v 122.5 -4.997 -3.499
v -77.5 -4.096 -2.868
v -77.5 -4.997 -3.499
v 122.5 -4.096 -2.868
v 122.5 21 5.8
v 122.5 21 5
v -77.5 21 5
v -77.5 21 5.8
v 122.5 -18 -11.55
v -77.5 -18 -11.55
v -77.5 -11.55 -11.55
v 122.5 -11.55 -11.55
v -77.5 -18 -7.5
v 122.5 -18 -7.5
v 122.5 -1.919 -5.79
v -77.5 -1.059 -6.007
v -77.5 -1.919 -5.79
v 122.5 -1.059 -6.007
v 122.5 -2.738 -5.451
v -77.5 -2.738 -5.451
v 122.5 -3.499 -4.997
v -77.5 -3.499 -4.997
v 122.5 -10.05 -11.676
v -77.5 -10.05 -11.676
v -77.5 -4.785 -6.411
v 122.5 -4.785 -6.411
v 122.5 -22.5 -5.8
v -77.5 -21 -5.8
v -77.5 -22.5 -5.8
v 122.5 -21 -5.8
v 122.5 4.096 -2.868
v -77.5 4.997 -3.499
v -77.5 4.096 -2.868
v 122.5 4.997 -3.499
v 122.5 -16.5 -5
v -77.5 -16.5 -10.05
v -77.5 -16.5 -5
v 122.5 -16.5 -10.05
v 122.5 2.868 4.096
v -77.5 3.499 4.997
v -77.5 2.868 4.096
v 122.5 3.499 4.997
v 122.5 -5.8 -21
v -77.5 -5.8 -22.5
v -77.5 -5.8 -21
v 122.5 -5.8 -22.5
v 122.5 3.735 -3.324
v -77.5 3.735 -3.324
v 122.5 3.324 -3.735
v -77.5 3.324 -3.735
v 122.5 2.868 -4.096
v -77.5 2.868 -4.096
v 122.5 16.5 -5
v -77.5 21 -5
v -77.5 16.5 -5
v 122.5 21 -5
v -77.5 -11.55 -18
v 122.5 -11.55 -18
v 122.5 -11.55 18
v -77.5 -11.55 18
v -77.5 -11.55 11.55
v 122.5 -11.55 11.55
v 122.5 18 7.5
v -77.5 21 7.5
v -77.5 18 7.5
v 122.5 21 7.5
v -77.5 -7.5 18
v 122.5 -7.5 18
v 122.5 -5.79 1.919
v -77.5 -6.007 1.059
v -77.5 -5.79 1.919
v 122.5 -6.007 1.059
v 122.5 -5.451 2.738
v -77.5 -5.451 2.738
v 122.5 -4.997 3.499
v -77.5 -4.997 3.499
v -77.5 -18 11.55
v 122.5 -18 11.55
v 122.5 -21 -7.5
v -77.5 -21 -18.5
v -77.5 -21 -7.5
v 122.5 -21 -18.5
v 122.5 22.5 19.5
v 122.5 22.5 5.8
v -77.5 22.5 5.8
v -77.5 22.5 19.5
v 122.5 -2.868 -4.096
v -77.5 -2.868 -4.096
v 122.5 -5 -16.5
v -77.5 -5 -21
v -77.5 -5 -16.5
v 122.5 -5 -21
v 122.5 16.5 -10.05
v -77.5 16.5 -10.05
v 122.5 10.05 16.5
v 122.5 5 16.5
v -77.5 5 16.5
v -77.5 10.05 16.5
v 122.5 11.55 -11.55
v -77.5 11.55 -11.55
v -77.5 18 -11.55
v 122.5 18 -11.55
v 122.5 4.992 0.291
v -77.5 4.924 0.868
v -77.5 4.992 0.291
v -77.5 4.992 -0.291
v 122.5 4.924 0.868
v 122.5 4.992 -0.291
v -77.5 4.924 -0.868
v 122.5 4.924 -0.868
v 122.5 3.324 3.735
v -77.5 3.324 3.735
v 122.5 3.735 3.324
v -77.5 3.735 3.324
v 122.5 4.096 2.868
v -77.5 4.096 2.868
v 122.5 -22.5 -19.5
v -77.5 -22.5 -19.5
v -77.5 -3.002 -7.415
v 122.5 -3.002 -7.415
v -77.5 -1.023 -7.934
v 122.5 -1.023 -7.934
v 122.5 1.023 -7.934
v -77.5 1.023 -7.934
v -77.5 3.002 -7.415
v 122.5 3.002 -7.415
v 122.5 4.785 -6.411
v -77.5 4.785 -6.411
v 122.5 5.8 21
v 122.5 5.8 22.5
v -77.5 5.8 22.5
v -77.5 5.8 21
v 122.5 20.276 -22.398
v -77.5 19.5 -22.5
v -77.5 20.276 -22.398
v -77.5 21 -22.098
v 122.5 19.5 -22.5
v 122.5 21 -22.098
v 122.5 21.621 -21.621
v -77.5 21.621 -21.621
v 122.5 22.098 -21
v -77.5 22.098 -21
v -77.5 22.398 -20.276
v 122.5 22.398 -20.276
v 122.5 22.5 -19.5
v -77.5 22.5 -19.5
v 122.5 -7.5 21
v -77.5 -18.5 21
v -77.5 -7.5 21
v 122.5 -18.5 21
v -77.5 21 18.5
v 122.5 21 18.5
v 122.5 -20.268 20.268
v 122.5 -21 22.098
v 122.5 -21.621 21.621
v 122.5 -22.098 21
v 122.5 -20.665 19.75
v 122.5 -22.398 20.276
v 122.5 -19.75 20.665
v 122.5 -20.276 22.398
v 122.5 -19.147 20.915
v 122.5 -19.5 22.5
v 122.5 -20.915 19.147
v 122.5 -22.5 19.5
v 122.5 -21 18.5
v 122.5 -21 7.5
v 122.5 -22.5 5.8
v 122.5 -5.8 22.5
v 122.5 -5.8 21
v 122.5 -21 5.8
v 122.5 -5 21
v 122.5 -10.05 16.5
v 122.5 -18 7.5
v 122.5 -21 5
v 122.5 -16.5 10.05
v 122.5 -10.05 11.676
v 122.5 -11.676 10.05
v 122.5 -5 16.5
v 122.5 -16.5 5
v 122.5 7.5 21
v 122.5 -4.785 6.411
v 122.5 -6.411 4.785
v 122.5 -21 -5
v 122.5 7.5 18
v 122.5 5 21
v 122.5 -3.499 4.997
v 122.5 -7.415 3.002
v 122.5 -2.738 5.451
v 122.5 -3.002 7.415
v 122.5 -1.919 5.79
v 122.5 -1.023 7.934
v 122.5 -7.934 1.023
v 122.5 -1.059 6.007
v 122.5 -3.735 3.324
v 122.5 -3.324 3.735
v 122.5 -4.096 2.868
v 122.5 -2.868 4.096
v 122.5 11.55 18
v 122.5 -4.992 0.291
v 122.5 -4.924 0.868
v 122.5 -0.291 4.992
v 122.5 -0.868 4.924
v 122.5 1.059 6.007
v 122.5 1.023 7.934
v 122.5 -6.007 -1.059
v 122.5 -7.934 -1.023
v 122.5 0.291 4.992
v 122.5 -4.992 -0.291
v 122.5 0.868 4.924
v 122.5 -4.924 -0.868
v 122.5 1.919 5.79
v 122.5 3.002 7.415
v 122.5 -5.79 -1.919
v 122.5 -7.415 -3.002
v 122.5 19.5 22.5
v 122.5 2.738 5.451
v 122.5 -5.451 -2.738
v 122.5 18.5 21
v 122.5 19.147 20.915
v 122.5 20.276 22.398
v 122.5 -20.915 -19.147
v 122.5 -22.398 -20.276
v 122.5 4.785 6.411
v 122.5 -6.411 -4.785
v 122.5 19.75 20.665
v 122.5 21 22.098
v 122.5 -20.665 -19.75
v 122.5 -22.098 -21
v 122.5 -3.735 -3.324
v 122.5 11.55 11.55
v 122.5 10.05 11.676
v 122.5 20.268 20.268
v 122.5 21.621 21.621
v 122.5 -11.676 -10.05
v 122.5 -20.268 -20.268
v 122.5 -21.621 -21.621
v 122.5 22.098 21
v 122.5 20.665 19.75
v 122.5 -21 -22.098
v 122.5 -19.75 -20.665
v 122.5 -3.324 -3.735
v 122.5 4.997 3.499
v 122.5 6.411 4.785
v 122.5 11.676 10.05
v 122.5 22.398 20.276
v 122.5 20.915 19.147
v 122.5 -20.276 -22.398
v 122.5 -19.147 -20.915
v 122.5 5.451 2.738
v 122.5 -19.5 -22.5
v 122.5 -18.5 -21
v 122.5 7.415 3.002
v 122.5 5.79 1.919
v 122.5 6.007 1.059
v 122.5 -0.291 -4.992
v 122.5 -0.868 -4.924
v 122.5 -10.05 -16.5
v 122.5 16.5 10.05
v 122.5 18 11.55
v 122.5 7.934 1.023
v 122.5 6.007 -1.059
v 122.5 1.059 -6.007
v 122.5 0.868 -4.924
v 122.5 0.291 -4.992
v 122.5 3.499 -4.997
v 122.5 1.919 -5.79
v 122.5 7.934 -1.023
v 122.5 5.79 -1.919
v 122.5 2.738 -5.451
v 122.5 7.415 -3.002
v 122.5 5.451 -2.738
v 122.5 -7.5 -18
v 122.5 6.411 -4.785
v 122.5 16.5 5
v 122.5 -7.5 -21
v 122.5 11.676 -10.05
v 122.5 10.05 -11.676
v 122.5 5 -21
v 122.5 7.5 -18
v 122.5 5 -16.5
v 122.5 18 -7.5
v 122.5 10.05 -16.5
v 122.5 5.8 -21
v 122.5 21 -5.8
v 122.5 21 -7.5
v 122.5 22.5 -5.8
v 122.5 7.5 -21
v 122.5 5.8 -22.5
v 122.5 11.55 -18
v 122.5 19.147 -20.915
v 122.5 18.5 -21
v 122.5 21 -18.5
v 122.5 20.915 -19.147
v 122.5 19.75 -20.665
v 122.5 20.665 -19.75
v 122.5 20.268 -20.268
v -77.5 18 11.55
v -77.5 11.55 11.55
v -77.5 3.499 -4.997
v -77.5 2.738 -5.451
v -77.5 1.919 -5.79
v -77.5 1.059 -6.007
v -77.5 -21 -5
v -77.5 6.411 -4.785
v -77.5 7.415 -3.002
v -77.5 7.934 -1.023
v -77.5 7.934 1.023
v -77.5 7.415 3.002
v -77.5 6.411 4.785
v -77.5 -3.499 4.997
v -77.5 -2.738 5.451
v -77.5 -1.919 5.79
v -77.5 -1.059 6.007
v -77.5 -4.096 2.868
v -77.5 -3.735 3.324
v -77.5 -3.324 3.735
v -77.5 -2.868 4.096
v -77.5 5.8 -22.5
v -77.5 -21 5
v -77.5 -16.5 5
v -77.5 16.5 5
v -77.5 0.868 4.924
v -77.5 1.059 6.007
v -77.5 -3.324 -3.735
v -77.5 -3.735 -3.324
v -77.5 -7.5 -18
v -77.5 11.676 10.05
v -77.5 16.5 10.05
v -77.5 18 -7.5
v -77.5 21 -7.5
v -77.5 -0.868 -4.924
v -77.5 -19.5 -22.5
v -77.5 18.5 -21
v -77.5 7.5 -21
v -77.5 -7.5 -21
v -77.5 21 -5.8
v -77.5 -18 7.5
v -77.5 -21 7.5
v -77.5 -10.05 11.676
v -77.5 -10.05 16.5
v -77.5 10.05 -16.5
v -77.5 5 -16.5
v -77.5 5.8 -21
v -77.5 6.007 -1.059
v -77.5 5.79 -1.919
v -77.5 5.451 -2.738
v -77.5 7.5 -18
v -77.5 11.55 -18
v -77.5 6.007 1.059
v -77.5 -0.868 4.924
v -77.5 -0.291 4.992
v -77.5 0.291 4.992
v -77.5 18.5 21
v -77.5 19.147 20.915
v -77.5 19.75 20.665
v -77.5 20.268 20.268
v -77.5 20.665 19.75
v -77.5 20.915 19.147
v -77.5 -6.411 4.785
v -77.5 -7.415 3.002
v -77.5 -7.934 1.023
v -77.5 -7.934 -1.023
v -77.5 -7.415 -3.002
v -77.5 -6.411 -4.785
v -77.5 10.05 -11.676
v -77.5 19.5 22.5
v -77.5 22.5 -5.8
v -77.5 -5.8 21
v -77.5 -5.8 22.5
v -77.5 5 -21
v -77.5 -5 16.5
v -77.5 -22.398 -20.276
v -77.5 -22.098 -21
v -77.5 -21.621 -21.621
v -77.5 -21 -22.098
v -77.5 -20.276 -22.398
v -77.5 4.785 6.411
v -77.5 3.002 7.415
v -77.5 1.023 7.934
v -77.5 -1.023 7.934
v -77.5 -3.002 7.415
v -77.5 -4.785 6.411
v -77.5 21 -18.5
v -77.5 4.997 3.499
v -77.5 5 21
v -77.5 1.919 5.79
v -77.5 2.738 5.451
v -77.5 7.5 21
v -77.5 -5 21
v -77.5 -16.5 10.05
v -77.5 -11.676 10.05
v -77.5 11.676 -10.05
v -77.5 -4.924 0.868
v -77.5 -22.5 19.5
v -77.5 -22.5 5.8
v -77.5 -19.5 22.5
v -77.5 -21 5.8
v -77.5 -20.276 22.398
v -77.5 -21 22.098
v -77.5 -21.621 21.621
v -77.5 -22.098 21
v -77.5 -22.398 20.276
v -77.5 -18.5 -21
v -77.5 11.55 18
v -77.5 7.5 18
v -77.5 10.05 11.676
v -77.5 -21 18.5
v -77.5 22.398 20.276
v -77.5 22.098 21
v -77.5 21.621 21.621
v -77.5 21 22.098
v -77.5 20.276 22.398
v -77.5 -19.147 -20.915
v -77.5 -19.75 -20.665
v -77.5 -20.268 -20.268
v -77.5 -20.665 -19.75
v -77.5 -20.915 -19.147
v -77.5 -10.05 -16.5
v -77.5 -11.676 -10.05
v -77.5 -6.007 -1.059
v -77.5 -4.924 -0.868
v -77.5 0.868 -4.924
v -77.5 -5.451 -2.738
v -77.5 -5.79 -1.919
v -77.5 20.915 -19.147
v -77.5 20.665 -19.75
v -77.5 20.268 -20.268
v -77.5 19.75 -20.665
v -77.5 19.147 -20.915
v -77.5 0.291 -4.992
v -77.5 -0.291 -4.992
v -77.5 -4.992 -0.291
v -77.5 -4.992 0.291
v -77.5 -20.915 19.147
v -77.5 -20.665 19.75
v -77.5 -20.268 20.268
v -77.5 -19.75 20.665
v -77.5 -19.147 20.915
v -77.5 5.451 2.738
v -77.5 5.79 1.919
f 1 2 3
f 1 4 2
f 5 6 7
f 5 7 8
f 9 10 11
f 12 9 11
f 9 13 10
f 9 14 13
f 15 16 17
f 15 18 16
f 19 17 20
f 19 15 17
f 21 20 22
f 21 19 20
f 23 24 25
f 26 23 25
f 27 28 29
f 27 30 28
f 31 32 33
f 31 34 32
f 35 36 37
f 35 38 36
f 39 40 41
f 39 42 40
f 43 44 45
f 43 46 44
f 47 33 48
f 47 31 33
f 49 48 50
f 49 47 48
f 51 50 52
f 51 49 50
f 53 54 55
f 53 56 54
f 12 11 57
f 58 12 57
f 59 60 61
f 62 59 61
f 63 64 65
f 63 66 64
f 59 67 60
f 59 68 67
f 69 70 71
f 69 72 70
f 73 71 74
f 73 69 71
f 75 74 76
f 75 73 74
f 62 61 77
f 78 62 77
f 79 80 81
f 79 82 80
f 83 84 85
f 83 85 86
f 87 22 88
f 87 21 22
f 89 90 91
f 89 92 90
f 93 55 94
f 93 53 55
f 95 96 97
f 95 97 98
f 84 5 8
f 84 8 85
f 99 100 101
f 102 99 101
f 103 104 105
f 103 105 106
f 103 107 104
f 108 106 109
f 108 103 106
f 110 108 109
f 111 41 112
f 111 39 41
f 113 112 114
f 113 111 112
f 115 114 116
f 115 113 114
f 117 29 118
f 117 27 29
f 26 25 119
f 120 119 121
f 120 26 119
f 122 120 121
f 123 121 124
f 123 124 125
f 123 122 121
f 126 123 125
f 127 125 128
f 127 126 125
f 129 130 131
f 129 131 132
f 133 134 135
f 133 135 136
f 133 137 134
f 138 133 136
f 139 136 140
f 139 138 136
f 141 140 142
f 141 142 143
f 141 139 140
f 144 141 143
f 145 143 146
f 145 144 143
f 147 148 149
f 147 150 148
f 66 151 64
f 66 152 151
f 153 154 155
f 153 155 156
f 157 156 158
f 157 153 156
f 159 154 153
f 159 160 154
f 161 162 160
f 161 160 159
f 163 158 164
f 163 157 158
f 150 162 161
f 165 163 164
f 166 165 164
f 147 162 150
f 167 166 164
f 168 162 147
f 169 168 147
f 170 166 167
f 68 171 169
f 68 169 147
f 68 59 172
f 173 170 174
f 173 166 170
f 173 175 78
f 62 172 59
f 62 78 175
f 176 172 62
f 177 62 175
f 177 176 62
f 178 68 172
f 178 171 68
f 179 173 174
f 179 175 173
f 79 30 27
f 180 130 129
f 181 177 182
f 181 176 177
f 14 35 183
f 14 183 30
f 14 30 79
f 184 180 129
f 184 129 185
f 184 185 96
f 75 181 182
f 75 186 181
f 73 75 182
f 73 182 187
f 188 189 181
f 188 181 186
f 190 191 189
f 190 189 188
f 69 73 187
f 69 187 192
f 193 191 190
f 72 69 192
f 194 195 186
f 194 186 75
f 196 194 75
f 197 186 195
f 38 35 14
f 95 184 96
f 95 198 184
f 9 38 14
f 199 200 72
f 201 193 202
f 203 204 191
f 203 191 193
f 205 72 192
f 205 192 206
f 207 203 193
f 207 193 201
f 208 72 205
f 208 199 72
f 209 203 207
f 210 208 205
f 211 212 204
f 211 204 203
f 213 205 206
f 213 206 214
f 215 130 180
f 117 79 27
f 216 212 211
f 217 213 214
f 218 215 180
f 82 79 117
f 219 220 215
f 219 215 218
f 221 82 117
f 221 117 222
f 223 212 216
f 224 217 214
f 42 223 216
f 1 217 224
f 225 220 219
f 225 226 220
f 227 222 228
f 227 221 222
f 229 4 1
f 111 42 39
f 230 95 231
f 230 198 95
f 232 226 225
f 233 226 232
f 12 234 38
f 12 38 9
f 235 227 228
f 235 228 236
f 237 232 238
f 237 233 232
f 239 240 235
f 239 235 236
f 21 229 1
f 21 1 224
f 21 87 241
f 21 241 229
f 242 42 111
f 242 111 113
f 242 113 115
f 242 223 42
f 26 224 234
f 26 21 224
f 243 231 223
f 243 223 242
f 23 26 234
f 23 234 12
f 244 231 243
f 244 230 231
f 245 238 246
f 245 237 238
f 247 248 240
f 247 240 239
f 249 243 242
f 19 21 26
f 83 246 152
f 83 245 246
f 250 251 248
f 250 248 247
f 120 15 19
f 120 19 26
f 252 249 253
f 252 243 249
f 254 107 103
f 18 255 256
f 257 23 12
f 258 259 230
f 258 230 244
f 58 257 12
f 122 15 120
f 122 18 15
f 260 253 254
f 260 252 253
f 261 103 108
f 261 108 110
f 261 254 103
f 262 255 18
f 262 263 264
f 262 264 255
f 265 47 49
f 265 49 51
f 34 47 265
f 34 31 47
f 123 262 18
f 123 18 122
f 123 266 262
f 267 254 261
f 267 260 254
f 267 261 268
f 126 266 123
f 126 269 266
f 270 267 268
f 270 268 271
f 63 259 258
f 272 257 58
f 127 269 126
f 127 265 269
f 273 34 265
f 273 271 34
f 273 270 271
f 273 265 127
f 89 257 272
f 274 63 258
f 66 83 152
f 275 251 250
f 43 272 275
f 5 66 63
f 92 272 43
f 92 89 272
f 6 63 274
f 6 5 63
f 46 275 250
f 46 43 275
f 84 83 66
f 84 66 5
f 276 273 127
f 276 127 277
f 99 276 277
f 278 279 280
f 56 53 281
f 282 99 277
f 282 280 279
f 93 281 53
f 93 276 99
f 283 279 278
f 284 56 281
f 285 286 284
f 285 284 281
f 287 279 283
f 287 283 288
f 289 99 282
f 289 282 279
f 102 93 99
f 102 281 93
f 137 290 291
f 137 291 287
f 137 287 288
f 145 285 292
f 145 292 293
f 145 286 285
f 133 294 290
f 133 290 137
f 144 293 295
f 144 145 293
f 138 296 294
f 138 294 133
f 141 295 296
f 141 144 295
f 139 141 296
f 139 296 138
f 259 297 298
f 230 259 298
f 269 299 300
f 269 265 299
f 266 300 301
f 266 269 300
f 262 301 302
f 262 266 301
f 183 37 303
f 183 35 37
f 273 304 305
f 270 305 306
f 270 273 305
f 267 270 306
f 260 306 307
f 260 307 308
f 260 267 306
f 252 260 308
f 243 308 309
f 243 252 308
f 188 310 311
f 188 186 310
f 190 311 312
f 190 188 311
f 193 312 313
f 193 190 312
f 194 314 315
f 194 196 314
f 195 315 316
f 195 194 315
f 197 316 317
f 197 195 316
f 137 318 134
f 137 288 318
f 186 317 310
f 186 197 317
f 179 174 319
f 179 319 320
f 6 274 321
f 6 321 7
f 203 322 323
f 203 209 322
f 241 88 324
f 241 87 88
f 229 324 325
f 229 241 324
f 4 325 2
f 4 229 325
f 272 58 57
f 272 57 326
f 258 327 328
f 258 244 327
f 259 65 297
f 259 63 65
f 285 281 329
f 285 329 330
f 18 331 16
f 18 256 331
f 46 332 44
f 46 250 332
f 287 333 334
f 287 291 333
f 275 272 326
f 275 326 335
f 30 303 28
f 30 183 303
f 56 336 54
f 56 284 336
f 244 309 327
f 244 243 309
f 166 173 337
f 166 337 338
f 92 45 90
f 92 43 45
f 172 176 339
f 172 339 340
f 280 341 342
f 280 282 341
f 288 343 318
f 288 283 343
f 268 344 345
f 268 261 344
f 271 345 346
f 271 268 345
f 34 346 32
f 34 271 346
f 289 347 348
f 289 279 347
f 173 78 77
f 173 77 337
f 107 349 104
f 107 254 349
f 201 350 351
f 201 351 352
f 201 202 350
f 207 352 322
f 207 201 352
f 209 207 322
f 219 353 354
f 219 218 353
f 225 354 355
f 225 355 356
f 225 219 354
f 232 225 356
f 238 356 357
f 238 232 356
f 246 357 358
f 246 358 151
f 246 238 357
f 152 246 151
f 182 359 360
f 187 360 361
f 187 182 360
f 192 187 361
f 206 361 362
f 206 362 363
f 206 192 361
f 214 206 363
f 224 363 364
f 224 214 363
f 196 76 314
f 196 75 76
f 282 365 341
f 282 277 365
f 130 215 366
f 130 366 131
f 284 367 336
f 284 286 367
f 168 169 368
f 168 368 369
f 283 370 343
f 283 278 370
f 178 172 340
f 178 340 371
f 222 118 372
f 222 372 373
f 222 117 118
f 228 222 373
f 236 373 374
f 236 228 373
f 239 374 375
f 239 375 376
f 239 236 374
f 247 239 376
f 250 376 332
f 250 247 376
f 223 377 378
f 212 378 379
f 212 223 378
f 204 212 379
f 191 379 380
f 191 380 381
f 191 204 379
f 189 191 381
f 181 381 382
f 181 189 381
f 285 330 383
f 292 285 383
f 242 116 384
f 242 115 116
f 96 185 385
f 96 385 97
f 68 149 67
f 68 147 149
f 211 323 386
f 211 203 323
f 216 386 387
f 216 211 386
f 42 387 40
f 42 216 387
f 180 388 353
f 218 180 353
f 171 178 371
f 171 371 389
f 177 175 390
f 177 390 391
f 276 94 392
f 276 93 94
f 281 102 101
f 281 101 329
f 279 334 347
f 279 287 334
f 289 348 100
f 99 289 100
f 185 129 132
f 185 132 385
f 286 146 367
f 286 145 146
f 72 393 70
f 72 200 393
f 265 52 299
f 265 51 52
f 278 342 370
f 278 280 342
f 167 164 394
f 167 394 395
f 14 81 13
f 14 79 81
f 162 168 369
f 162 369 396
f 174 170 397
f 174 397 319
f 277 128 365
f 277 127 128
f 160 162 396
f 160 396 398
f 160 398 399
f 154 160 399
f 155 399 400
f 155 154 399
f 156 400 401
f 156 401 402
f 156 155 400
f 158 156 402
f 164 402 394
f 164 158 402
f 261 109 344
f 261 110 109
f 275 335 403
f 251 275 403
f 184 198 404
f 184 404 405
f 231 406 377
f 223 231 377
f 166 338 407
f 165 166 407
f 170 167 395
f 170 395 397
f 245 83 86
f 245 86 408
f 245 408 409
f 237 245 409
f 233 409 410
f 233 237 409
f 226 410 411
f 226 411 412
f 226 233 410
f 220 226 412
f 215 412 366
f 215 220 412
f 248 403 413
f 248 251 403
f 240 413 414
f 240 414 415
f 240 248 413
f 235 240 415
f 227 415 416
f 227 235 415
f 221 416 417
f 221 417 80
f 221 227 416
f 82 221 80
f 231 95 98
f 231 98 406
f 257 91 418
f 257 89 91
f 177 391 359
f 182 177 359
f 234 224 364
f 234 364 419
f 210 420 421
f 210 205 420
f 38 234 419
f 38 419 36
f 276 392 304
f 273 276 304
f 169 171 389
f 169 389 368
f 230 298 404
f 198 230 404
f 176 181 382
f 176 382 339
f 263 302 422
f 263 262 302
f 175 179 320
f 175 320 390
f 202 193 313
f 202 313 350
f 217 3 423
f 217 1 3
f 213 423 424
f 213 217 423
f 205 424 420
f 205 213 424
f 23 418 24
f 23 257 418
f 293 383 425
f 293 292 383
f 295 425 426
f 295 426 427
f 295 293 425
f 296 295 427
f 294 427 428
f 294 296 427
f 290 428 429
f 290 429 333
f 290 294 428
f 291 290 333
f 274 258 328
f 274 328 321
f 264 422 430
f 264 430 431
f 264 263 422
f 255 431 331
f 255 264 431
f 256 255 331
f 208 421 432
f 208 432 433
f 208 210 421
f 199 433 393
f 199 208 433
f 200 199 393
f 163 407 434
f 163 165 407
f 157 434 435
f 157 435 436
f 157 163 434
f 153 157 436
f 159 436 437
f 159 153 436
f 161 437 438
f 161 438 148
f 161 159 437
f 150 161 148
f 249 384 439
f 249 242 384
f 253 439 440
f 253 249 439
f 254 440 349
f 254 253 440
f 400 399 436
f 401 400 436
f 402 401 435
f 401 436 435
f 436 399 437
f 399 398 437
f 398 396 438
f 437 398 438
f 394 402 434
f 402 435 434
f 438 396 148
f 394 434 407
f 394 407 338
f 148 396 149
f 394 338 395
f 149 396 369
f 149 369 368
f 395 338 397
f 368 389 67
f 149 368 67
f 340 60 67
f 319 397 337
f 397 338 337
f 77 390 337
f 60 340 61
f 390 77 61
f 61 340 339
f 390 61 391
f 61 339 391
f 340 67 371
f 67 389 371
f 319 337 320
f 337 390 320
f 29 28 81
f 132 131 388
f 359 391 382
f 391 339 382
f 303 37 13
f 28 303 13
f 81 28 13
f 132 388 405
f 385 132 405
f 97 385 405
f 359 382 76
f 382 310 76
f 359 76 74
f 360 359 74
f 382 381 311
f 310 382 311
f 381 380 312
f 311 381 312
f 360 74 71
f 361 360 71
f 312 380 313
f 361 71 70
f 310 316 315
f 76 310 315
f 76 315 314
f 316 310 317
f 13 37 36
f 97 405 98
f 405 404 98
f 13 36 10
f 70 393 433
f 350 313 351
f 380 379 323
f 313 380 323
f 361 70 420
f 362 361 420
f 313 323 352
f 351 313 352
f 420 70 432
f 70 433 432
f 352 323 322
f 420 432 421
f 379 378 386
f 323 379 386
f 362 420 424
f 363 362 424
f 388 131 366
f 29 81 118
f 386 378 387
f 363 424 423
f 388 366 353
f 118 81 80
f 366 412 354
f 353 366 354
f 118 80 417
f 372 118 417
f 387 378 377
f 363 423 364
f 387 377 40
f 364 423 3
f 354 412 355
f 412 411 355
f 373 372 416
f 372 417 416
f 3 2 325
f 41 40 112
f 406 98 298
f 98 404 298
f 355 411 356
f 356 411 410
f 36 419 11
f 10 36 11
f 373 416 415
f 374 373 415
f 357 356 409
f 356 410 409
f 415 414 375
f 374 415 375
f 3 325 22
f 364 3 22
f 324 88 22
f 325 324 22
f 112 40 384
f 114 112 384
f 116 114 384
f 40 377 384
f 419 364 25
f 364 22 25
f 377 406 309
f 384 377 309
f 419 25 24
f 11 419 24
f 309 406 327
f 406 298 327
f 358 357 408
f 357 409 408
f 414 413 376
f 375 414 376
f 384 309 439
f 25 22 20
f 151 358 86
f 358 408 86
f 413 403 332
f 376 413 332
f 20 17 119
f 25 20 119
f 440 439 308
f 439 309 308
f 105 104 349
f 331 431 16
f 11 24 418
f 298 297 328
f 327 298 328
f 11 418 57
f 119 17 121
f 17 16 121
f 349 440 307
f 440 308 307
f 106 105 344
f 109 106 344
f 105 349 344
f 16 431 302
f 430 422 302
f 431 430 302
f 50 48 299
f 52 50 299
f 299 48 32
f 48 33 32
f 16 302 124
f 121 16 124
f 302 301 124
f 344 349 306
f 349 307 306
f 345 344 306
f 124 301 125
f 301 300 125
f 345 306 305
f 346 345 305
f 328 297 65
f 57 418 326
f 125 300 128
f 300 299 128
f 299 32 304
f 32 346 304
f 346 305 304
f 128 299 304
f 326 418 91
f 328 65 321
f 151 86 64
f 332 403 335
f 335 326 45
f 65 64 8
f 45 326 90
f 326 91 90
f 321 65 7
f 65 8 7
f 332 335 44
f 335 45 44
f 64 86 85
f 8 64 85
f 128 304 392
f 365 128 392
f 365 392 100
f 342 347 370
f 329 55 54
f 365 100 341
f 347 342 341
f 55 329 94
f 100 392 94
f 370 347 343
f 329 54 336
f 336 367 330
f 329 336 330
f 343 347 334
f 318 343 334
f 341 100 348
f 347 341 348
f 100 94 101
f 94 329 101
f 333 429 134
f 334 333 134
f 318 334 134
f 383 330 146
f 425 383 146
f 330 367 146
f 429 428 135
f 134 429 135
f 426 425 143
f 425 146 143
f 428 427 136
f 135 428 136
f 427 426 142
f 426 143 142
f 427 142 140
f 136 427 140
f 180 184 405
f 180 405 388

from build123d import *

# Parameters (mm, degrees)
BR_EXTRUDE_DEPTH      = 122.5
BR_EXTRUDE_DEPTH_BACK = 77.5


with BuildPart() as part:
    # Sketch2 → BR_Extrude (new body, two sides)
    with BuildSketch(Plane(origin=(0, 0, 0), x_dir=(0, 0, -1), z_dir=(1, 0, 0))) as br_extrude_sk:
        with BuildLine():
            Line((-10.05, 11.676345597), (-10.05, 16.5))
            Line((-10.05, 16.5), (-5, 16.5))
            Line((-5, 16.5), (-5, 21))
            Line((-5, 21), (-5.8, 21))
            Line((-5.8, 21), (-5.8, 22.5))
            Line((-5.8, 22.5), (-19.5, 22.5))
            ThreePointArc((-19.5, 22.5), (-21.621320344, 21.621320344), (-22.5, 19.5))
            Line((-22.5, 19.5), (-22.5, 5.8))
            Line((-22.5, 5.8), (-21, 5.8))
            Line((-21, 5.8), (-21, 5))
            Line((-21, 5), (-16.5, 5))
            Line((-16.5, 5), (-16.5, 10.05))
            Line((-16.5, 10.05), (-11.676345597, 10.05))
            Line((-11.676345597, 10.05), (-6.411275155, 4.784929559))
            ThreePointArc((-6.411275155, 4.784929559), (-8, 0), (-6.411275155, -4.784929559))
            Line((-6.411275155, -4.784929559), (-11.676345597, -10.05))
            Line((-11.676345597, -10.05), (-16.5, -10.05))
            Line((-16.5, -10.05), (-16.5, -5))
            Line((-16.5, -5), (-21, -5))
            Line((-21, -5), (-21, -5.8))
            Line((-21, -5.8), (-22.5, -5.8))
            Line((-22.5, -5.8), (-22.5, -19.5))
            ThreePointArc((-22.5, -19.5), (-21.621320344, -21.621320344), (-19.5, -22.5))
            Line((-19.5, -22.5), (-5.8, -22.5))
            Line((-5.8, -22.5), (-5.8, -21))
            Line((-5.8, -21), (-5, -21))
            Line((-5, -21), (-5, -16.5))
            Line((-5, -16.5), (-10.05, -16.5))
            Line((-10.05, -16.5), (-10.05, -11.676345597))
            Line((-10.05, -11.676345597), (-4.784929559, -6.411275155))
            ThreePointArc((-4.784929559, -6.411275155), (0, -8), (4.784929559, -6.411275155))
            Line((4.784929559, -6.411275155), (10.05, -11.676345597))
            Line((10.05, -11.676345597), (10.05, -16.5))
            Line((10.05, -16.5), (5, -16.5))
            Line((5, -16.5), (5, -21))
            Line((5, -21), (5.8, -21))
            Line((5.8, -21), (5.8, -22.5))
            Line((5.8, -22.5), (19.5, -22.5))
            ThreePointArc((19.5, -22.5), (21.621320344, -21.621320344), (22.5, -19.5))
            Line((22.5, -19.5), (22.5, -5.8))
            Line((22.5, -5.8), (21, -5.8))
            Line((21, -5.8), (21, -5))
            Line((21, -5), (16.5, -5))
            Line((16.5, -5), (16.5, -10.05))
            Line((16.5, -10.05), (11.676345597, -10.05))
            Line((11.676345597, -10.05), (6.411275155, -4.784929559))
            ThreePointArc((6.411275155, -4.784929559), (8, 0), (6.411275155, 4.784929559))
            Line((6.411275155, 4.784929559), (11.676345597, 10.05))
            Line((11.676345597, 10.05), (16.5, 10.05))
            Line((16.5, 10.05), (16.5, 5))
            Line((16.5, 5), (21, 5))
            Line((21, 5), (21, 5.8))
            Line((21, 5.8), (22.5, 5.8))
            Line((22.5, 5.8), (22.5, 19.5))
            ThreePointArc((22.5, 19.5), (21.621320344, 21.621320344), (19.5, 22.5))
            Line((19.5, 22.5), (5.8, 22.5))
            Line((5.8, 22.5), (5.8, 21))
            Line((5.8, 21), (5, 21))
            Line((5, 21), (5, 16.5))
            Line((5, 16.5), (10.05, 16.5))
            Line((10.05, 16.5), (10.05, 11.676345597))
            Line((10.05, 11.676345597), (4.784929559, 6.411275155))
            ThreePointArc((4.784929559, 6.411275155), (0, 8), (-4.784929559, 6.411275155))
            Line((-4.784929559, 6.411275155), (-10.05, 11.676345597))
        make_face()
        with BuildLine():
            Line((11.55, 11.55), (11.55, 18))
            Line((11.55, 18), (7.5, 18))
            Line((7.5, 18), (7.5, 21))
            Line((7.5, 21), (18.5, 21))
            ThreePointArc((18.5, 21), (20.267766953, 20.267766953), (21, 18.5))
            Line((21, 18.5), (21, 7.5))
            Line((21, 7.5), (18, 7.5))
            Line((18, 7.5), (18, 11.55))
            Line((18, 11.55), (11.55, 11.55))
        make_face(mode=Mode.SUBTRACT)
        with BuildLine():
            Line((11.55, -11.55), (18, -11.55))
            Line((18, -11.55), (18, -7.5))
            Line((18, -7.5), (21, -7.5))
            Line((21, -7.5), (21, -18.5))
            ThreePointArc((21, -18.5), (20.267766953, -20.267766953), (18.5, -21))
            Line((18.5, -21), (7.5, -21))
            Line((7.5, -21), (7.5, -18))
            Line((7.5, -18), (11.55, -18))
            Line((11.55, -18), (11.55, -11.55))
        make_face(mode=Mode.SUBTRACT)
        with BuildLine():
            Line((-11.55, 11.55), (-18, 11.55))
            Line((-18, 11.55), (-18, 7.5))
            Line((-18, 7.5), (-21, 7.5))
            Line((-21, 7.5), (-21, 18.5))
            ThreePointArc((-21, 18.5), (-20.267766953, 20.267766953), (-18.5, 21))
            Line((-18.5, 21), (-7.5, 21))
            Line((-7.5, 21), (-7.5, 18))
            Line((-7.5, 18), (-11.55, 18))
            Line((-11.55, 18), (-11.55, 11.55))
        make_face(mode=Mode.SUBTRACT)
        with BuildLine():
            Line((-11.55, -11.55), (-11.55, -18))
            Line((-11.55, -18), (-7.5, -18))
            Line((-7.5, -18), (-7.5, -21))
            Line((-7.5, -21), (-18.5, -21))
            ThreePointArc((-18.5, -21), (-20.267766953, -20.267766953), (-21, -18.5))
            Line((-21, -18.5), (-21, -7.5))
            Line((-21, -7.5), (-18, -7.5))
            Line((-18, -7.5), (-18, -11.55))
            Line((-18, -11.55), (-11.55, -11.55))
        make_face(mode=Mode.SUBTRACT)
        with BuildLine():
            Line((-6.007327293, -1.059253884), (-4.924038765, -0.868240888))
            ThreePointArc((-4.924038765, -0.868240888), (-5, 0), (-4.924038765, 0.868240888))
            Line((-4.924038765, 0.868240888), (-6.007327293, 1.059253884))
            ThreePointArc((-6.007327293, 1.059253884), (-5.635665148, 2.334368937), (-4.99682747, 3.498816262))
            Line((-4.99682747, 3.498816262), (-4.095760221, 2.867882182))
            ThreePointArc((-4.095760221, 2.867882182), (-3.535533906, 3.535533906), (-2.867882182, 4.095760221))
            Line((-2.867882182, 4.095760221), (-3.498816262, 4.99682747))
            ThreePointArc((-3.498816262, 4.99682747), (-2.334368937, 5.635665148), (-1.059253884, 6.007327293))
            Line((-1.059253884, 6.007327293), (-0.868240888, 4.924038765))
            ThreePointArc((-0.868240888, 4.924038765), (0, 5), (0.868240888, 4.924038765))
            Line((0.868240888, 4.924038765), (1.059253884, 6.007327293))
            ThreePointArc((1.059253884, 6.007327293), (2.334368937, 5.635665148), (3.498816262, 4.99682747))
            Line((3.498816262, 4.99682747), (2.867882182, 4.095760221))
            ThreePointArc((2.867882182, 4.095760221), (3.535533906, 3.535533906), (4.095760221, 2.867882182))
            Line((4.095760221, 2.867882182), (4.99682747, 3.498816262))
            ThreePointArc((4.99682747, 3.498816262), (5.635665148, 2.334368937), (6.007327293, 1.059253884))
            Line((6.007327293, 1.059253884), (4.924038765, 0.868240888))
            ThreePointArc((4.924038765, 0.868240888), (5, 0), (4.924038765, -0.868240888))
            Line((4.924038765, -0.868240888), (6.007327293, -1.059253884))
            ThreePointArc((6.007327293, -1.059253884), (5.635665148, -2.334368937), (4.99682747, -3.498816262))
            Line((4.99682747, -3.498816262), (4.095760221, -2.867882182))
            ThreePointArc((4.095760221, -2.867882182), (3.535533906, -3.535533906), (2.867882182, -4.095760221))
            Line((2.867882182, -4.095760221), (3.498816262, -4.99682747))
            ThreePointArc((3.498816262, -4.99682747), (2.334368937, -5.635665148), (1.059253884, -6.007327293))
            Line((1.059253884, -6.007327293), (0.868240888, -4.924038765))
            ThreePointArc((0.868240888, -4.924038765), (0, -5), (-0.868240888, -4.924038765))
            Line((-0.868240888, -4.924038765), (-1.059253884, -6.007327293))
            ThreePointArc((-1.059253884, -6.007327293), (-2.334368937, -5.635665148), (-3.498816262, -4.99682747))
            Line((-3.498816262, -4.99682747), (-2.867882182, -4.095760221))
            ThreePointArc((-2.867882182, -4.095760221), (-3.535533906, -3.535533906), (-4.095760221, -2.867882182))
            Line((-4.095760221, -2.867882182), (-4.99682747, -3.498816262))
            ThreePointArc((-4.99682747, -3.498816262), (-5.635665148, -2.334368937), (-6.007327293, -1.059253884))
        make_face(mode=Mode.SUBTRACT)
    extrude(amount=BR_EXTRUDE_DEPTH)
    extrude(br_extrude_sk.sketch, amount=-BR_EXTRUDE_DEPTH_BACK)


solid = part.part
